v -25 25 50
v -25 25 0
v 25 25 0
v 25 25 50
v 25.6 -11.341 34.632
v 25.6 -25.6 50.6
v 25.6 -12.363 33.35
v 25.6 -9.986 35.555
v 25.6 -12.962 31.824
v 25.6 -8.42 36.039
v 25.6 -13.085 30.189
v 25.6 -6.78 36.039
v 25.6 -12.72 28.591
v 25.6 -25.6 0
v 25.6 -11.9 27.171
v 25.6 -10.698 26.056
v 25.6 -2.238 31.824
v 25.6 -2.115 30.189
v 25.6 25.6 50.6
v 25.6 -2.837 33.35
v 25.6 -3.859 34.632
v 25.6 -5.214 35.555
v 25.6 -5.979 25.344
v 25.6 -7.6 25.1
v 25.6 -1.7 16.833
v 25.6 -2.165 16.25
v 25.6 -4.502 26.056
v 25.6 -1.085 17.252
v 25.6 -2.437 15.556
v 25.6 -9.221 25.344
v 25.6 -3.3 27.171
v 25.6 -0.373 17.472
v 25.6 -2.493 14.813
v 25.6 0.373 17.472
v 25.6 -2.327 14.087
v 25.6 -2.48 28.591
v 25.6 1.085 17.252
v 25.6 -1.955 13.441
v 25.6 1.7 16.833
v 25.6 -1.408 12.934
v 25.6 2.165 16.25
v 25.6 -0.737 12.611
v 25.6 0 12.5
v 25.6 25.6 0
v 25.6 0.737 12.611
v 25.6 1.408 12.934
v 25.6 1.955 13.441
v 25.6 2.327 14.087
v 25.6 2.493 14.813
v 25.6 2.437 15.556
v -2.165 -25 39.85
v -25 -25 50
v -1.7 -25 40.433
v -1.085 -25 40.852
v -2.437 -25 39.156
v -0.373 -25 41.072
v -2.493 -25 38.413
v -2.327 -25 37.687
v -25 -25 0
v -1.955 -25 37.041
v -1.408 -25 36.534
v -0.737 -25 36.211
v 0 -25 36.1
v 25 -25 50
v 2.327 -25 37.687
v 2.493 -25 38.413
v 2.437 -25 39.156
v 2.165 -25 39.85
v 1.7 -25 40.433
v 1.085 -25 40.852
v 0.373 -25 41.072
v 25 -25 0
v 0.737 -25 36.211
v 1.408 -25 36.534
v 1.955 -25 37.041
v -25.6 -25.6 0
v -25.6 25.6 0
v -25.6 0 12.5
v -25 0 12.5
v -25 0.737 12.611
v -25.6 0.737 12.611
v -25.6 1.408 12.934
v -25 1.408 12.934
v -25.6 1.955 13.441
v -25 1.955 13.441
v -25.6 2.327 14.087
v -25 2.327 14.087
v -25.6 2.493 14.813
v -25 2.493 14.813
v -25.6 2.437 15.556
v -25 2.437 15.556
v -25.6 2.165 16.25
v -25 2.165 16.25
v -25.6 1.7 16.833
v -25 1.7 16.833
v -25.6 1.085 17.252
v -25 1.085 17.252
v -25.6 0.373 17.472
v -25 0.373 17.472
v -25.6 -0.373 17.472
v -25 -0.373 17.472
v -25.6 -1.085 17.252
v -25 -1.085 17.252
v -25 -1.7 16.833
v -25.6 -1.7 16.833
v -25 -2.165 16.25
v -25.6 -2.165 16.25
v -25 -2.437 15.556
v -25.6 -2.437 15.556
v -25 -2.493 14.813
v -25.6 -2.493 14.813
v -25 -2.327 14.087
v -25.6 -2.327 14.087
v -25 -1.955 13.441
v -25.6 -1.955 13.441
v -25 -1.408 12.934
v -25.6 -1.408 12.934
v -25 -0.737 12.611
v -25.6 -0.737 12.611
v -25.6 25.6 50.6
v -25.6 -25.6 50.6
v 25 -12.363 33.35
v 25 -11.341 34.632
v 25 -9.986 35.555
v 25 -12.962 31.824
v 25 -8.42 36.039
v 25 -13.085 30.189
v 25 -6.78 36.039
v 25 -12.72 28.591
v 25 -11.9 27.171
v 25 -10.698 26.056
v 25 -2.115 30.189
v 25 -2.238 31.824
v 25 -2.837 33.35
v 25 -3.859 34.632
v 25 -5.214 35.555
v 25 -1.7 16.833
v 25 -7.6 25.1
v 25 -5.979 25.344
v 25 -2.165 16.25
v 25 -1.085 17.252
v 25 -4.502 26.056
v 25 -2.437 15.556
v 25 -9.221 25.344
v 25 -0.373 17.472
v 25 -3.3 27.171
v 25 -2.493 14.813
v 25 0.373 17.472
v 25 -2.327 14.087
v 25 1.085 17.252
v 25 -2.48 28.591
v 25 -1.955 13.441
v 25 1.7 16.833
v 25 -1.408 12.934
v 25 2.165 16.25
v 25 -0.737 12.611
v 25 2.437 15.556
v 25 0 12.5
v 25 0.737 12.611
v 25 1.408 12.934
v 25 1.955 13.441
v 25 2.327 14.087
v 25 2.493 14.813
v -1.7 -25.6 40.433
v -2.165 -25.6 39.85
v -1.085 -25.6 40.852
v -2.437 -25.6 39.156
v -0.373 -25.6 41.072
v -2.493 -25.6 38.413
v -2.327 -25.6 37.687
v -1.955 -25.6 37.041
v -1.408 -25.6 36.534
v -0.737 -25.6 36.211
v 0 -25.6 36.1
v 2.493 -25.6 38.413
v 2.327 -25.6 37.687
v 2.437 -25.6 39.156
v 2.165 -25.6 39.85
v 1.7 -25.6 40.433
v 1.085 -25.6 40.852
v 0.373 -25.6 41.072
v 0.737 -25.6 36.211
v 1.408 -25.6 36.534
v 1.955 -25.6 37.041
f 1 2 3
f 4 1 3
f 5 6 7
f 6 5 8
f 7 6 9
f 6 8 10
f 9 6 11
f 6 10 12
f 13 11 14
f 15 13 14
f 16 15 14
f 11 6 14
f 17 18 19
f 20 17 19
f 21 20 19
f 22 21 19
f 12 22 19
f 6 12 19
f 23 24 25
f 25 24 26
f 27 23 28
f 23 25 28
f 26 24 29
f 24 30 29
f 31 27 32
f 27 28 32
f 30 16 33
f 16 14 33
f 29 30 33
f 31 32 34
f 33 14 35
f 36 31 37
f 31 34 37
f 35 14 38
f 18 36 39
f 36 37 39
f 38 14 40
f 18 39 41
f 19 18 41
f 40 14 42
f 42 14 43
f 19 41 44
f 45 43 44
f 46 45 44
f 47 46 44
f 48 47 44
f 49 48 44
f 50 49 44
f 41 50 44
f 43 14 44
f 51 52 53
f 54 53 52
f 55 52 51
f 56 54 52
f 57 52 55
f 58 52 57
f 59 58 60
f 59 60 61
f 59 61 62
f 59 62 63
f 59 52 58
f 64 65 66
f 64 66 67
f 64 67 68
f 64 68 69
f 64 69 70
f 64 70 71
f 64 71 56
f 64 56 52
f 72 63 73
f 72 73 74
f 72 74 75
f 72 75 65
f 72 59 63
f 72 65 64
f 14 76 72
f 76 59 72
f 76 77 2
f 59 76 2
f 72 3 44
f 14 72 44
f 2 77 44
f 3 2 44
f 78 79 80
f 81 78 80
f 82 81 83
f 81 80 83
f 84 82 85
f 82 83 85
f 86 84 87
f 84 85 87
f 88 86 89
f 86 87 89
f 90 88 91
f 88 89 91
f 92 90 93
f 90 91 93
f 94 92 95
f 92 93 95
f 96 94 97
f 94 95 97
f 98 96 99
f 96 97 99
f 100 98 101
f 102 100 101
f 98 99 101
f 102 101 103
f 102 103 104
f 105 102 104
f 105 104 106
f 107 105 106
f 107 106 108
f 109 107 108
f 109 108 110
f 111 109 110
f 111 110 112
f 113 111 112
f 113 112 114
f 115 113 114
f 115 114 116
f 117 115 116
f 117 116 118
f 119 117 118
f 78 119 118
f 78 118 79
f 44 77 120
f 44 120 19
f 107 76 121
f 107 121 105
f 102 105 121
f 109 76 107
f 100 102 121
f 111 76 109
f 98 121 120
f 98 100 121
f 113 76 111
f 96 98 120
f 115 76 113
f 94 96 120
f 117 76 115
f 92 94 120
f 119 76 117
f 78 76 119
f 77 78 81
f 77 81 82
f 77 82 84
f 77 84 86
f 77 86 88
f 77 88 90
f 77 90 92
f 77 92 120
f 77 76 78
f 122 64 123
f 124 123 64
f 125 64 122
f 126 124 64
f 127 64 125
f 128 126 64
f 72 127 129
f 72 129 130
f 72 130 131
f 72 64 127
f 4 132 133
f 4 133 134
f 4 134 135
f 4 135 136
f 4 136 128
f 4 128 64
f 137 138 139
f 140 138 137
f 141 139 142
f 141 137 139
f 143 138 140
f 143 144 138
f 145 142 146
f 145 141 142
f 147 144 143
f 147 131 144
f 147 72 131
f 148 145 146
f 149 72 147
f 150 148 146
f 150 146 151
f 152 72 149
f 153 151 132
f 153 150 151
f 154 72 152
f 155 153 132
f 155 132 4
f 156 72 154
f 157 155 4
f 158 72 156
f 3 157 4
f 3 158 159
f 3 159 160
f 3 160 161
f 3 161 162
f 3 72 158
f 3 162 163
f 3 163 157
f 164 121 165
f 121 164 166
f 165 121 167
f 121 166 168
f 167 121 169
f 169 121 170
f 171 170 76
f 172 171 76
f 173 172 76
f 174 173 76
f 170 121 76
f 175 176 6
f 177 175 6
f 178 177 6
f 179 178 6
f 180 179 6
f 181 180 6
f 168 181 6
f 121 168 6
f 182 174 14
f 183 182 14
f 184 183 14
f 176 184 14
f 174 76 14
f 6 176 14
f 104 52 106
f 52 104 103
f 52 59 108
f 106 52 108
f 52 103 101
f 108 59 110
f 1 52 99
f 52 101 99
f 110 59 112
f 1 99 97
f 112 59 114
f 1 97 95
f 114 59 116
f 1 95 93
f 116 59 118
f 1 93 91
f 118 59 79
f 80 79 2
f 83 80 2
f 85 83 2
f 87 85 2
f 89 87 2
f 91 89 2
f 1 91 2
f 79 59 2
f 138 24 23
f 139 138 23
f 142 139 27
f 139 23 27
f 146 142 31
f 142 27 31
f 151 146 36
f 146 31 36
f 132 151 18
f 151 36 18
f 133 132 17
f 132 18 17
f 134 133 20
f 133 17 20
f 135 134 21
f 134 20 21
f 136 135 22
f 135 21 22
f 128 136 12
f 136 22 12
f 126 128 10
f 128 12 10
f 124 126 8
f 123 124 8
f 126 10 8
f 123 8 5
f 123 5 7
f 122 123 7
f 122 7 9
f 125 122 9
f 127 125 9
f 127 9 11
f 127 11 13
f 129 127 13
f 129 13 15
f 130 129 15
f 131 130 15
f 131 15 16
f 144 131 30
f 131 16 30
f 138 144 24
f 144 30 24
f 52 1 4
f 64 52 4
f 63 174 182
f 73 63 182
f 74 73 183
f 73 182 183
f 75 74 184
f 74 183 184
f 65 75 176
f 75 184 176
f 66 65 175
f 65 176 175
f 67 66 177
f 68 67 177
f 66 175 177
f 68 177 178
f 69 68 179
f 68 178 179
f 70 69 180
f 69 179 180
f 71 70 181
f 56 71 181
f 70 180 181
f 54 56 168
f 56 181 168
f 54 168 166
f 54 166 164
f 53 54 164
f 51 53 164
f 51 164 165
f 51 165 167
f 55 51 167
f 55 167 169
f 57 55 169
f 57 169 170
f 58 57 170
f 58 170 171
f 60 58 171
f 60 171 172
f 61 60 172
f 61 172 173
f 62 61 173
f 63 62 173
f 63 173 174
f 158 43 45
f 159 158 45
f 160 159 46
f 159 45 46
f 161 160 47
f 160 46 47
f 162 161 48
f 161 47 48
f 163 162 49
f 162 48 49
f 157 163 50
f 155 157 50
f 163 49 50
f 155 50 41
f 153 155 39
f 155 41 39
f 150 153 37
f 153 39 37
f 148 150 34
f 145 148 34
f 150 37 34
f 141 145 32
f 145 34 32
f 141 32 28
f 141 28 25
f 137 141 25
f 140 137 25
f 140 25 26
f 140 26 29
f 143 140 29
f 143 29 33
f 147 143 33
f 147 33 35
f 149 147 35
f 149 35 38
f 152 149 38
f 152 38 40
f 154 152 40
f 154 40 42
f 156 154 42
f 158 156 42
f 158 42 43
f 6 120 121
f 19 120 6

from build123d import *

# Parameters (mm, degrees)
ESBO_O1_W                = 51.2
ESBO_O1_H                = 51.2
ESBO_O1_W_2              = 50
ESBO_O1_H_2              = 50
RESSALTO_EXTRUS_O1_DEPTH = 50
ESBO_O2_W                = 51.2
ESBO_O2_H                = 51.2
RESSALTO_EXTRUS_O2_DEPTH = 0.6
ESBO_O3_R                = 5.5
CORTE_EXTRUS_O1_DEPTH    = 0.6
ESBO_O4_R                = 2.5
CORTE_EXTRUS_O2_DEPTH    = 77.401308889
CORTE_EXTRUS_O3_REACH    = 78.401
ESBO_O5_R                = 2.5


with BuildPart() as part:
    # Esboço1 → Ressalto-extrusão1 (new body)
    with BuildSketch(Plane.XY):
        Rectangle(ESBO_O1_W, ESBO_O1_H)
        Rectangle(ESBO_O1_W_2, ESBO_O1_H_2, mode=Mode.SUBTRACT)
    extrude(amount=RESSALTO_EXTRUS_O1_DEPTH)

    # Esboço2 → Ressalto-extrusão2 (add)
    with BuildSketch(Plane.XY.offset(50)):
        Rectangle(ESBO_O2_W, ESBO_O2_H)
    extrude(amount=RESSALTO_EXTRUS_O2_DEPTH)

    # Esboço3 → Corte-extrusão1 (cut)
    with BuildSketch(Plane(origin=(25.6, 0, 0), x_dir=(0, 0, -1), z_dir=(1, 0, 0))):
        with Locations((-30.6, -7.6)):
            Circle(ESBO_O3_R)
    extrude(amount=-CORTE_EXTRUS_O1_DEPTH, mode=Mode.SUBTRACT)

    # Esboço4 → Corte-extrusão2 (cut, through all)
    with BuildSketch(Plane(origin=(25.6, 0, 0), x_dir=(0, 0, -1), z_dir=(1, 0, 0))):
        with Locations((-15, 0)):
            Circle(ESBO_O4_R)
    extrude(amount=-CORTE_EXTRUS_O2_DEPTH, mode=Mode.SUBTRACT)

    # Esboço5 → Corte-extrusão3 (cut, up to next)
    with BuildSketch(Plane.XZ.offset(25.6), mode=Mode.PRIVATE) as corte_extrus_o3_sk1:
        with Locations(Location((0, 38.6, 0), (0, 0, 270))):
            Circle(ESBO_O5_R)
    corte_extrus_o3_tool1 = extrude(corte_extrus_o3_sk1.sketch, amount=-CORTE_EXTRUS_O3_REACH, mode=Mode.PRIVATE) & part.part
    add(corte_extrus_o3_tool1.solids().sort_by_distance((0, -25.6, 38.6))[0], mode=Mode.SUBTRACT)


solid = part.part
